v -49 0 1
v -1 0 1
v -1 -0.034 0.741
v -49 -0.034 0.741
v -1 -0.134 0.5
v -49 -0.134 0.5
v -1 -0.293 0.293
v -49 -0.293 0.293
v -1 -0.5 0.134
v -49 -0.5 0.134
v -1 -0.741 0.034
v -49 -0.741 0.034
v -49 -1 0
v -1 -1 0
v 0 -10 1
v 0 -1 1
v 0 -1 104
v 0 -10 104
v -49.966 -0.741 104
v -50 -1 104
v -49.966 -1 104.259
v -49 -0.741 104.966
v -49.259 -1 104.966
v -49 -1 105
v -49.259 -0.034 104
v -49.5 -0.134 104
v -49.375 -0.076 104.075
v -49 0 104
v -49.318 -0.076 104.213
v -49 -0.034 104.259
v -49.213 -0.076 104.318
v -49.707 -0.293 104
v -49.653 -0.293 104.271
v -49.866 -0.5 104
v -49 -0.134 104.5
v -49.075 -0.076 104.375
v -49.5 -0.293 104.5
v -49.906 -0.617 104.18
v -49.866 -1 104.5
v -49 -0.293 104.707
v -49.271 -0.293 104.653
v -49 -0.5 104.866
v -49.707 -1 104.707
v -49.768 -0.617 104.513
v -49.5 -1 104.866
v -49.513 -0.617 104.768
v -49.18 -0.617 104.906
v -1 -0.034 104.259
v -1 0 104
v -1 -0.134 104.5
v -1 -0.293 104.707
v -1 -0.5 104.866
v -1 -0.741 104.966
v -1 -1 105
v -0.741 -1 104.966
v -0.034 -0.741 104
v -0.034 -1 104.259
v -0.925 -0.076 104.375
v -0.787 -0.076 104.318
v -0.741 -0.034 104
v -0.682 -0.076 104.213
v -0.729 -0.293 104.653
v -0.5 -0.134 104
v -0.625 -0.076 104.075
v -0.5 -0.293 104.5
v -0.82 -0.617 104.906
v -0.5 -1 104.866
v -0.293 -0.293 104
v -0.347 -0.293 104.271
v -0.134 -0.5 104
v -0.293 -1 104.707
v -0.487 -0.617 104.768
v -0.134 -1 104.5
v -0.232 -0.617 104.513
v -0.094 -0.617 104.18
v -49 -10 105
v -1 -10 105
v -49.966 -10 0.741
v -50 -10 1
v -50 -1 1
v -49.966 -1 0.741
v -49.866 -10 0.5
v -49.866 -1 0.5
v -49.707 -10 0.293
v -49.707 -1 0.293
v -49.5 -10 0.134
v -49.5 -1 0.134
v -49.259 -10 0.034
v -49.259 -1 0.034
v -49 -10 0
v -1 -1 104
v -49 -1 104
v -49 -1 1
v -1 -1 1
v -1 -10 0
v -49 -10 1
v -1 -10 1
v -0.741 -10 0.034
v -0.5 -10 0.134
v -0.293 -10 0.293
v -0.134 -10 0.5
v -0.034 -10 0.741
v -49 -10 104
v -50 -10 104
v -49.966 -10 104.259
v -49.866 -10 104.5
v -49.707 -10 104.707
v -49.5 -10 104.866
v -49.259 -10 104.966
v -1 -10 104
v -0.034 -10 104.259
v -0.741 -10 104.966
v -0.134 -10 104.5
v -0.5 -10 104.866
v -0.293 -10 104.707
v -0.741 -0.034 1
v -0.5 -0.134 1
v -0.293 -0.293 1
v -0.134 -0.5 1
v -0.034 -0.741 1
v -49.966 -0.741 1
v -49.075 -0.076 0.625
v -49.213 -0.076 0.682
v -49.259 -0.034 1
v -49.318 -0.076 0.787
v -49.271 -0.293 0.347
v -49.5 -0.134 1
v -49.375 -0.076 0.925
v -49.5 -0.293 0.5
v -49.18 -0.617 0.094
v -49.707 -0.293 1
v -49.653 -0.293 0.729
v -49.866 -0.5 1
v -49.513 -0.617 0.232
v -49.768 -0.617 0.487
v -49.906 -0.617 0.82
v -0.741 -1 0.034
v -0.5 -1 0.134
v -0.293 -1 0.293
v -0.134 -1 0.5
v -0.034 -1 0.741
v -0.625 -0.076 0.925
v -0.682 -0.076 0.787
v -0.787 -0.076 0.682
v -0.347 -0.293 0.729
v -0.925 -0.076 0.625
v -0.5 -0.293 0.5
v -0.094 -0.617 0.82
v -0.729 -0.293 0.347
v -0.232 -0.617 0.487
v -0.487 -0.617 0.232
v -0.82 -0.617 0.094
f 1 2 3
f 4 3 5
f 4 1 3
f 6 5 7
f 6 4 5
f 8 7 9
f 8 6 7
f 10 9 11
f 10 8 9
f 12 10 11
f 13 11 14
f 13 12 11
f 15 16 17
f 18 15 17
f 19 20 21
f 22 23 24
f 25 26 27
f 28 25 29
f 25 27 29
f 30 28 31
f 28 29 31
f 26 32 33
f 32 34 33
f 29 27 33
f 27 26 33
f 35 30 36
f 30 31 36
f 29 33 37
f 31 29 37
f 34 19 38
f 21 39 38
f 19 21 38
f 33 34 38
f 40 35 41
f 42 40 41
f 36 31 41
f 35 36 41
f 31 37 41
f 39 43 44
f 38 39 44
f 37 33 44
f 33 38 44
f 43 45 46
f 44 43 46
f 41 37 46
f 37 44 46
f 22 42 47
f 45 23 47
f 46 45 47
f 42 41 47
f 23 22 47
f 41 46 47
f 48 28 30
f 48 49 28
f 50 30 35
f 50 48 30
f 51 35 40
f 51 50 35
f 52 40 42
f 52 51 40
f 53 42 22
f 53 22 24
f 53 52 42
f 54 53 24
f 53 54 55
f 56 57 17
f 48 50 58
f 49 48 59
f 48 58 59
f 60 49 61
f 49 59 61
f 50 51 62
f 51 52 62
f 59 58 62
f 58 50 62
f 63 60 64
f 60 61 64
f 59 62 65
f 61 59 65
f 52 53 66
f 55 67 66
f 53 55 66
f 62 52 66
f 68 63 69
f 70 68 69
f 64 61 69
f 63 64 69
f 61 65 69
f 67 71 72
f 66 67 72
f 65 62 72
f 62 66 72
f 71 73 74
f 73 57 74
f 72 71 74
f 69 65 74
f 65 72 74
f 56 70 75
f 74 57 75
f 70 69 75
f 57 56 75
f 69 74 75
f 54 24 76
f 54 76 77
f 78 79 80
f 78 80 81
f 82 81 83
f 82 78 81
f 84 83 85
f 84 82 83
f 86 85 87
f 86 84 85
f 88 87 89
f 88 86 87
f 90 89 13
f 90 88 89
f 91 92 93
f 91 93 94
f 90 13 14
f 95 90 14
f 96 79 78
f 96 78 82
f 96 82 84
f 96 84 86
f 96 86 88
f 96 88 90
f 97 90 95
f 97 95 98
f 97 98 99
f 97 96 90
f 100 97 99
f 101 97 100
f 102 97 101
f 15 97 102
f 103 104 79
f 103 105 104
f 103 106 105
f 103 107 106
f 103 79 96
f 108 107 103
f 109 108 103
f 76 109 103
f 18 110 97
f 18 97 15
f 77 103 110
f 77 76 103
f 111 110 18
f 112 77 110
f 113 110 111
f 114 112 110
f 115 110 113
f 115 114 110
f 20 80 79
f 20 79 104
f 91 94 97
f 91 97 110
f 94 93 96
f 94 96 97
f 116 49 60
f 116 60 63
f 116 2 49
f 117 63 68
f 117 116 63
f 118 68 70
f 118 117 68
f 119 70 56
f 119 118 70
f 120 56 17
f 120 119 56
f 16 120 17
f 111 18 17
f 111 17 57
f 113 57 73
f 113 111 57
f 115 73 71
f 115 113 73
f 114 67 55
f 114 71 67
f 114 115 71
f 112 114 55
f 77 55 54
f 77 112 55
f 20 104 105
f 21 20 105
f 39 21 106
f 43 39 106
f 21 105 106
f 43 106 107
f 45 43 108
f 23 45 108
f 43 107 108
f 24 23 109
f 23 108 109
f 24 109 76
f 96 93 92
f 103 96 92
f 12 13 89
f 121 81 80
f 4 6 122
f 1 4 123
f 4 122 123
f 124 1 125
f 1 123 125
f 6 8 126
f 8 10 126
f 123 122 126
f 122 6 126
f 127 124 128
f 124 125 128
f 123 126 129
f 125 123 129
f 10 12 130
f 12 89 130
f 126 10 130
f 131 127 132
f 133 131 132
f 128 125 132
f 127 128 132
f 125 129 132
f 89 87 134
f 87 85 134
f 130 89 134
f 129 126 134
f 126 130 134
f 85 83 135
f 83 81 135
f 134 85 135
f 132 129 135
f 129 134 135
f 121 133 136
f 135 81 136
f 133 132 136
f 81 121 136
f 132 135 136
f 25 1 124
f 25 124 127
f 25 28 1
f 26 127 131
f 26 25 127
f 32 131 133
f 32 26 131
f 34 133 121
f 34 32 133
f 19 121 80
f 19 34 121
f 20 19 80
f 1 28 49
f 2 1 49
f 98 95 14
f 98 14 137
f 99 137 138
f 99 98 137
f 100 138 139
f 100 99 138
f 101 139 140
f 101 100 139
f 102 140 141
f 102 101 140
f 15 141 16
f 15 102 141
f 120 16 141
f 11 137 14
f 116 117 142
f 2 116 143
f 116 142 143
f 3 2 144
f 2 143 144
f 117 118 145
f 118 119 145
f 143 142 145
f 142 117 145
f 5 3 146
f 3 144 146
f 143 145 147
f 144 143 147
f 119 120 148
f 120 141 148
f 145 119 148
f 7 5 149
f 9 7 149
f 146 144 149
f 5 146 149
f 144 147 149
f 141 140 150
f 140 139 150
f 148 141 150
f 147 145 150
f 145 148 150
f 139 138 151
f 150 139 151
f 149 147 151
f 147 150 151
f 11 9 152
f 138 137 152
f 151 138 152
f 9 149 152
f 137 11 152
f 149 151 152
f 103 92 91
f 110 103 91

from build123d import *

# Parameters (mm, degrees)
F0_W     = 50
F0_H     = 105
F1_DEPTH = 10
F2_R     = 1
F3_R     = 1
F4_T     = 1


# Not quite as in the source:
# - a shell that OpenCascade refuses in one call is made with other operations: the cavity is built on its own and cut out


with BuildPart() as f1:
    # F0 (on Front) → F1 (new body)
    with BuildSketch(Plane.XZ):
        with Locations((-25, 52.5)):
            Rectangle(F0_W, F0_H)
    extrude(amount=F1_DEPTH)

    # F2
    f2_edges = [f1.edges().sort_by_distance(p)[0] for p in [
        (-50, -5, 105),
        (0, -5, 105),
        (0, -5, 0),
        (-50, -5, 0),
    ]]
    fillet(f2_edges, radius=F2_R)

    # F3
    f3_edges = [f1.edges().sort_by_distance(p)[0] for p in [
        (-25, 0, 105),
    ]]
    fillet(f3_edges, radius=F3_R)

    # F4: shell of thickness 1, made by hand


with BuildPart() as f4_core1:
    # F4_t2: copy of F1
    add(f1.part)

    # the walls: a layer under each face that stays
    f4_faces = [f4_core1.faces().sort_by_distance(p)[0] for p in [
        (0, -5.5, 52.5),
        (-25, -5.5, 0),
        (-25, 0, 52.5),
        (-25, -5.5, 105),
        (-50, -5.5, 52.5),
    ]]
    thicken(f4_faces, amount=-F4_T, mode=Mode.SUBTRACT)


with BuildPart() as f1_1:
    add(f1.part)

    # what is left inside the walls is the cavity
    f4_cavity = [f4_core1.part.solids().sort_by_distance(p)[0] for p in [
        (-25, -1.01, 35.333333),
    ]]
    add(f4_cavity, mode=Mode.SUBTRACT)


solid = f1_1.part
